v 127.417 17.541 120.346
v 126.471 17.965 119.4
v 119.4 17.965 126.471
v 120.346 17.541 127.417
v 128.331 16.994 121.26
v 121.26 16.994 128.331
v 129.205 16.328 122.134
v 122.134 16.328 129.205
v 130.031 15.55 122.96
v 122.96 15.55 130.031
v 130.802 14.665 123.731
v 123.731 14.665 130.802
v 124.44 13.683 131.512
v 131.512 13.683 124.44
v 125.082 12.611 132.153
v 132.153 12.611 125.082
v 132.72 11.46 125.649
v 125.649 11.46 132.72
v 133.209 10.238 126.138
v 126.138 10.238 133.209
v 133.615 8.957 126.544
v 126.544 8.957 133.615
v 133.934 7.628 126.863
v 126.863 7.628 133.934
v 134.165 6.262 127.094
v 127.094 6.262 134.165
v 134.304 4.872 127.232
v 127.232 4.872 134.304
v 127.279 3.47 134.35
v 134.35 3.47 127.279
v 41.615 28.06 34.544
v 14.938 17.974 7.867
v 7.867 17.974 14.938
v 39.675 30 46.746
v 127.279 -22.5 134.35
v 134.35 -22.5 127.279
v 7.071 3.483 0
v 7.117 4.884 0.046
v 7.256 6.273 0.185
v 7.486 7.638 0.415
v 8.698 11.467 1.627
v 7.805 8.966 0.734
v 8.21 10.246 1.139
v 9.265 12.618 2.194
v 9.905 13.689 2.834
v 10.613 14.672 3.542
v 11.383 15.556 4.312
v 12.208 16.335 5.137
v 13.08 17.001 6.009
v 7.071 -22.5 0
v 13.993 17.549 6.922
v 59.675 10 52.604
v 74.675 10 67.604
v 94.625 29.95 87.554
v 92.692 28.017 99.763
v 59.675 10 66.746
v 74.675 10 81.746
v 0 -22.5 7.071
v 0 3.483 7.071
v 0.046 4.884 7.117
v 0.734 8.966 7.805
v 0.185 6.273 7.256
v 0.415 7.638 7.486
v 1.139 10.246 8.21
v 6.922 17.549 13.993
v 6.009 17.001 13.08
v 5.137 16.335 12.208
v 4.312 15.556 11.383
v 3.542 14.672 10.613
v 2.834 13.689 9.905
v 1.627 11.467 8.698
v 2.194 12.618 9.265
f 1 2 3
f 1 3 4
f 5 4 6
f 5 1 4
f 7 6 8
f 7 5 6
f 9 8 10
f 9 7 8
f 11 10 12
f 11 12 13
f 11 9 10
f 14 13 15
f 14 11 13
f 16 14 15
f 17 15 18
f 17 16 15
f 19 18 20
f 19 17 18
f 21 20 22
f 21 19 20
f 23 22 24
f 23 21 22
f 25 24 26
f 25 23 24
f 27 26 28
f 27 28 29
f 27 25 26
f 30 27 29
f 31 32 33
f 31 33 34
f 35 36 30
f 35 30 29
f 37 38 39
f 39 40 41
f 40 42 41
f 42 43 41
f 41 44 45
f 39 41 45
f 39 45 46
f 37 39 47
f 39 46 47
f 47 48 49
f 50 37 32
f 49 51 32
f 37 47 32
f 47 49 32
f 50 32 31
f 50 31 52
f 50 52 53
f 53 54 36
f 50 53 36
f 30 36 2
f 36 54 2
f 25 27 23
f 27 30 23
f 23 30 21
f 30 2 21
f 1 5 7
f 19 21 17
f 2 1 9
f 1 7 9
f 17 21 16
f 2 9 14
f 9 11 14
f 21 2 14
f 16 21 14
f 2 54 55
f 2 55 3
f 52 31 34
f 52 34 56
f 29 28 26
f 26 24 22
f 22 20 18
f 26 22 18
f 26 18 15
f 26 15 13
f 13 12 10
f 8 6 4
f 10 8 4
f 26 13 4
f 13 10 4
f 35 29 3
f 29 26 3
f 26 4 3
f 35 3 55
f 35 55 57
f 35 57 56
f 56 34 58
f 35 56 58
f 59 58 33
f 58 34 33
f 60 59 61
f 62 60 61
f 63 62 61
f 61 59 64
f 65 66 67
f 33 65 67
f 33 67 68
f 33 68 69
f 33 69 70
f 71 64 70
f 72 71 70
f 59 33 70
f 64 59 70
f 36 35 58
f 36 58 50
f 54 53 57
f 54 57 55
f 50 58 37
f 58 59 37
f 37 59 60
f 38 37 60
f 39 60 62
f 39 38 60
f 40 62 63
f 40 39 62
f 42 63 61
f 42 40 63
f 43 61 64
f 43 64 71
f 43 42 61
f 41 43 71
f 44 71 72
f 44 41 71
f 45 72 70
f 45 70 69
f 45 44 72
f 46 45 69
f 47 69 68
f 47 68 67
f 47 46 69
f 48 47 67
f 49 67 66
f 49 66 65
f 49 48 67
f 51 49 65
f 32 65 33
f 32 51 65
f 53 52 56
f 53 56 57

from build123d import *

# Parameters (mm, degrees)
EXTRUDE_1_DEPTH     = 134.35
SKETCH_2_OUTSIDE_W  = 174.82
SKETCH_2_OUTSIDE_H  = 174.82
CUT_EXTRUDE_1_DEPTH = 193.353437713
CUT_EXTRUDE_START   = -10
CUT_EXTRUDE_2_DEPTH = 10
EXTRUDE_2_DEPTH     = 22.5


# Read off the part's stored shape, not the designer's step: Вырез-Вытянуть2
with BuildPart() as part:
    # Эскиз1 → Бобышка-Вытянуть1 (new body)
    with BuildSketch(Plane.XY):
        Polygon((0, 0), (0, 30), (39.675, 30), (59.675, 10), (74.675, 10), (94.675, 30), (134.35, 30), (134.35, 0), align=None)
    extrude(amount=EXTRUDE_1_DEPTH)

    # Эскиз2 outside → Вырез-Вытянуть1 (cut, through all)
    with BuildSketch(Plane.XZ):
        with Locations((67.175, 67.175)):
            Rectangle(SKETCH_2_OUTSIDE_W, SKETCH_2_OUTSIDE_H)
        Polygon((127.278932188, 134.35), (0, 7.071067812), (7.071067812, 0), (134.35, 127.278932188), align=None, mode=Mode.SUBTRACT)
    extrude(amount=-CUT_EXTRUDE_1_DEPTH, mode=Mode.SUBTRACT)

    # Вырез-Вытянуть2 outline → Вырез-Вытянуть2 (cut)
    with BuildSketch(Plane(origin=(-3.535533906, 0, 3.535533906), x_dir=(0.7071067811865475, 0, 0.7071067811865477), z_dir=(-0.7071067811865477, 0, 0.7071067811865475)).offset(CUT_EXTRUDE_START)):
        with BuildLine():
            Line((5, 30), (5, 3.483288217))
            ThreePointArc((5, 3.483288217), (8.102307967, 12.618107552), (16.125989905, 17.974390514))
            Line((16.125989905, 17.974390514), (61.108923087, 30))
            Line((61.108923087, 30), (5, 30))
        make_face()
        with BuildLine():
            Line((184.999592105, 30), (128.634264977, 30))
            Line((128.634264977, 30), (128.820557467, 29.950423647))
            Line((128.820557467, 29.950423647), (173.857147448, 17.965239064))
            ThreePointArc((173.857147448, 17.965239064), (181.89209668, 12.611319604), (184.999592105, 3.469747807))
            Line((184.999592105, 3.469747807), (184.999592105, 30))
        make_face()
    extrude(amount=CUT_EXTRUDE_2_DEPTH, mode=Mode.SUBTRACT)

    # Эскиз5 → Бобышка-Вытянуть2 (add)
    with BuildSketch(Plane.XZ):
        Polygon((134.35, 127.278932188), (127.278932188, 134.35), (0, 7.071067812), (7.071067812, 0), align=None)
    extrude(amount=EXTRUDE_2_DEPTH)


solid = part.part
